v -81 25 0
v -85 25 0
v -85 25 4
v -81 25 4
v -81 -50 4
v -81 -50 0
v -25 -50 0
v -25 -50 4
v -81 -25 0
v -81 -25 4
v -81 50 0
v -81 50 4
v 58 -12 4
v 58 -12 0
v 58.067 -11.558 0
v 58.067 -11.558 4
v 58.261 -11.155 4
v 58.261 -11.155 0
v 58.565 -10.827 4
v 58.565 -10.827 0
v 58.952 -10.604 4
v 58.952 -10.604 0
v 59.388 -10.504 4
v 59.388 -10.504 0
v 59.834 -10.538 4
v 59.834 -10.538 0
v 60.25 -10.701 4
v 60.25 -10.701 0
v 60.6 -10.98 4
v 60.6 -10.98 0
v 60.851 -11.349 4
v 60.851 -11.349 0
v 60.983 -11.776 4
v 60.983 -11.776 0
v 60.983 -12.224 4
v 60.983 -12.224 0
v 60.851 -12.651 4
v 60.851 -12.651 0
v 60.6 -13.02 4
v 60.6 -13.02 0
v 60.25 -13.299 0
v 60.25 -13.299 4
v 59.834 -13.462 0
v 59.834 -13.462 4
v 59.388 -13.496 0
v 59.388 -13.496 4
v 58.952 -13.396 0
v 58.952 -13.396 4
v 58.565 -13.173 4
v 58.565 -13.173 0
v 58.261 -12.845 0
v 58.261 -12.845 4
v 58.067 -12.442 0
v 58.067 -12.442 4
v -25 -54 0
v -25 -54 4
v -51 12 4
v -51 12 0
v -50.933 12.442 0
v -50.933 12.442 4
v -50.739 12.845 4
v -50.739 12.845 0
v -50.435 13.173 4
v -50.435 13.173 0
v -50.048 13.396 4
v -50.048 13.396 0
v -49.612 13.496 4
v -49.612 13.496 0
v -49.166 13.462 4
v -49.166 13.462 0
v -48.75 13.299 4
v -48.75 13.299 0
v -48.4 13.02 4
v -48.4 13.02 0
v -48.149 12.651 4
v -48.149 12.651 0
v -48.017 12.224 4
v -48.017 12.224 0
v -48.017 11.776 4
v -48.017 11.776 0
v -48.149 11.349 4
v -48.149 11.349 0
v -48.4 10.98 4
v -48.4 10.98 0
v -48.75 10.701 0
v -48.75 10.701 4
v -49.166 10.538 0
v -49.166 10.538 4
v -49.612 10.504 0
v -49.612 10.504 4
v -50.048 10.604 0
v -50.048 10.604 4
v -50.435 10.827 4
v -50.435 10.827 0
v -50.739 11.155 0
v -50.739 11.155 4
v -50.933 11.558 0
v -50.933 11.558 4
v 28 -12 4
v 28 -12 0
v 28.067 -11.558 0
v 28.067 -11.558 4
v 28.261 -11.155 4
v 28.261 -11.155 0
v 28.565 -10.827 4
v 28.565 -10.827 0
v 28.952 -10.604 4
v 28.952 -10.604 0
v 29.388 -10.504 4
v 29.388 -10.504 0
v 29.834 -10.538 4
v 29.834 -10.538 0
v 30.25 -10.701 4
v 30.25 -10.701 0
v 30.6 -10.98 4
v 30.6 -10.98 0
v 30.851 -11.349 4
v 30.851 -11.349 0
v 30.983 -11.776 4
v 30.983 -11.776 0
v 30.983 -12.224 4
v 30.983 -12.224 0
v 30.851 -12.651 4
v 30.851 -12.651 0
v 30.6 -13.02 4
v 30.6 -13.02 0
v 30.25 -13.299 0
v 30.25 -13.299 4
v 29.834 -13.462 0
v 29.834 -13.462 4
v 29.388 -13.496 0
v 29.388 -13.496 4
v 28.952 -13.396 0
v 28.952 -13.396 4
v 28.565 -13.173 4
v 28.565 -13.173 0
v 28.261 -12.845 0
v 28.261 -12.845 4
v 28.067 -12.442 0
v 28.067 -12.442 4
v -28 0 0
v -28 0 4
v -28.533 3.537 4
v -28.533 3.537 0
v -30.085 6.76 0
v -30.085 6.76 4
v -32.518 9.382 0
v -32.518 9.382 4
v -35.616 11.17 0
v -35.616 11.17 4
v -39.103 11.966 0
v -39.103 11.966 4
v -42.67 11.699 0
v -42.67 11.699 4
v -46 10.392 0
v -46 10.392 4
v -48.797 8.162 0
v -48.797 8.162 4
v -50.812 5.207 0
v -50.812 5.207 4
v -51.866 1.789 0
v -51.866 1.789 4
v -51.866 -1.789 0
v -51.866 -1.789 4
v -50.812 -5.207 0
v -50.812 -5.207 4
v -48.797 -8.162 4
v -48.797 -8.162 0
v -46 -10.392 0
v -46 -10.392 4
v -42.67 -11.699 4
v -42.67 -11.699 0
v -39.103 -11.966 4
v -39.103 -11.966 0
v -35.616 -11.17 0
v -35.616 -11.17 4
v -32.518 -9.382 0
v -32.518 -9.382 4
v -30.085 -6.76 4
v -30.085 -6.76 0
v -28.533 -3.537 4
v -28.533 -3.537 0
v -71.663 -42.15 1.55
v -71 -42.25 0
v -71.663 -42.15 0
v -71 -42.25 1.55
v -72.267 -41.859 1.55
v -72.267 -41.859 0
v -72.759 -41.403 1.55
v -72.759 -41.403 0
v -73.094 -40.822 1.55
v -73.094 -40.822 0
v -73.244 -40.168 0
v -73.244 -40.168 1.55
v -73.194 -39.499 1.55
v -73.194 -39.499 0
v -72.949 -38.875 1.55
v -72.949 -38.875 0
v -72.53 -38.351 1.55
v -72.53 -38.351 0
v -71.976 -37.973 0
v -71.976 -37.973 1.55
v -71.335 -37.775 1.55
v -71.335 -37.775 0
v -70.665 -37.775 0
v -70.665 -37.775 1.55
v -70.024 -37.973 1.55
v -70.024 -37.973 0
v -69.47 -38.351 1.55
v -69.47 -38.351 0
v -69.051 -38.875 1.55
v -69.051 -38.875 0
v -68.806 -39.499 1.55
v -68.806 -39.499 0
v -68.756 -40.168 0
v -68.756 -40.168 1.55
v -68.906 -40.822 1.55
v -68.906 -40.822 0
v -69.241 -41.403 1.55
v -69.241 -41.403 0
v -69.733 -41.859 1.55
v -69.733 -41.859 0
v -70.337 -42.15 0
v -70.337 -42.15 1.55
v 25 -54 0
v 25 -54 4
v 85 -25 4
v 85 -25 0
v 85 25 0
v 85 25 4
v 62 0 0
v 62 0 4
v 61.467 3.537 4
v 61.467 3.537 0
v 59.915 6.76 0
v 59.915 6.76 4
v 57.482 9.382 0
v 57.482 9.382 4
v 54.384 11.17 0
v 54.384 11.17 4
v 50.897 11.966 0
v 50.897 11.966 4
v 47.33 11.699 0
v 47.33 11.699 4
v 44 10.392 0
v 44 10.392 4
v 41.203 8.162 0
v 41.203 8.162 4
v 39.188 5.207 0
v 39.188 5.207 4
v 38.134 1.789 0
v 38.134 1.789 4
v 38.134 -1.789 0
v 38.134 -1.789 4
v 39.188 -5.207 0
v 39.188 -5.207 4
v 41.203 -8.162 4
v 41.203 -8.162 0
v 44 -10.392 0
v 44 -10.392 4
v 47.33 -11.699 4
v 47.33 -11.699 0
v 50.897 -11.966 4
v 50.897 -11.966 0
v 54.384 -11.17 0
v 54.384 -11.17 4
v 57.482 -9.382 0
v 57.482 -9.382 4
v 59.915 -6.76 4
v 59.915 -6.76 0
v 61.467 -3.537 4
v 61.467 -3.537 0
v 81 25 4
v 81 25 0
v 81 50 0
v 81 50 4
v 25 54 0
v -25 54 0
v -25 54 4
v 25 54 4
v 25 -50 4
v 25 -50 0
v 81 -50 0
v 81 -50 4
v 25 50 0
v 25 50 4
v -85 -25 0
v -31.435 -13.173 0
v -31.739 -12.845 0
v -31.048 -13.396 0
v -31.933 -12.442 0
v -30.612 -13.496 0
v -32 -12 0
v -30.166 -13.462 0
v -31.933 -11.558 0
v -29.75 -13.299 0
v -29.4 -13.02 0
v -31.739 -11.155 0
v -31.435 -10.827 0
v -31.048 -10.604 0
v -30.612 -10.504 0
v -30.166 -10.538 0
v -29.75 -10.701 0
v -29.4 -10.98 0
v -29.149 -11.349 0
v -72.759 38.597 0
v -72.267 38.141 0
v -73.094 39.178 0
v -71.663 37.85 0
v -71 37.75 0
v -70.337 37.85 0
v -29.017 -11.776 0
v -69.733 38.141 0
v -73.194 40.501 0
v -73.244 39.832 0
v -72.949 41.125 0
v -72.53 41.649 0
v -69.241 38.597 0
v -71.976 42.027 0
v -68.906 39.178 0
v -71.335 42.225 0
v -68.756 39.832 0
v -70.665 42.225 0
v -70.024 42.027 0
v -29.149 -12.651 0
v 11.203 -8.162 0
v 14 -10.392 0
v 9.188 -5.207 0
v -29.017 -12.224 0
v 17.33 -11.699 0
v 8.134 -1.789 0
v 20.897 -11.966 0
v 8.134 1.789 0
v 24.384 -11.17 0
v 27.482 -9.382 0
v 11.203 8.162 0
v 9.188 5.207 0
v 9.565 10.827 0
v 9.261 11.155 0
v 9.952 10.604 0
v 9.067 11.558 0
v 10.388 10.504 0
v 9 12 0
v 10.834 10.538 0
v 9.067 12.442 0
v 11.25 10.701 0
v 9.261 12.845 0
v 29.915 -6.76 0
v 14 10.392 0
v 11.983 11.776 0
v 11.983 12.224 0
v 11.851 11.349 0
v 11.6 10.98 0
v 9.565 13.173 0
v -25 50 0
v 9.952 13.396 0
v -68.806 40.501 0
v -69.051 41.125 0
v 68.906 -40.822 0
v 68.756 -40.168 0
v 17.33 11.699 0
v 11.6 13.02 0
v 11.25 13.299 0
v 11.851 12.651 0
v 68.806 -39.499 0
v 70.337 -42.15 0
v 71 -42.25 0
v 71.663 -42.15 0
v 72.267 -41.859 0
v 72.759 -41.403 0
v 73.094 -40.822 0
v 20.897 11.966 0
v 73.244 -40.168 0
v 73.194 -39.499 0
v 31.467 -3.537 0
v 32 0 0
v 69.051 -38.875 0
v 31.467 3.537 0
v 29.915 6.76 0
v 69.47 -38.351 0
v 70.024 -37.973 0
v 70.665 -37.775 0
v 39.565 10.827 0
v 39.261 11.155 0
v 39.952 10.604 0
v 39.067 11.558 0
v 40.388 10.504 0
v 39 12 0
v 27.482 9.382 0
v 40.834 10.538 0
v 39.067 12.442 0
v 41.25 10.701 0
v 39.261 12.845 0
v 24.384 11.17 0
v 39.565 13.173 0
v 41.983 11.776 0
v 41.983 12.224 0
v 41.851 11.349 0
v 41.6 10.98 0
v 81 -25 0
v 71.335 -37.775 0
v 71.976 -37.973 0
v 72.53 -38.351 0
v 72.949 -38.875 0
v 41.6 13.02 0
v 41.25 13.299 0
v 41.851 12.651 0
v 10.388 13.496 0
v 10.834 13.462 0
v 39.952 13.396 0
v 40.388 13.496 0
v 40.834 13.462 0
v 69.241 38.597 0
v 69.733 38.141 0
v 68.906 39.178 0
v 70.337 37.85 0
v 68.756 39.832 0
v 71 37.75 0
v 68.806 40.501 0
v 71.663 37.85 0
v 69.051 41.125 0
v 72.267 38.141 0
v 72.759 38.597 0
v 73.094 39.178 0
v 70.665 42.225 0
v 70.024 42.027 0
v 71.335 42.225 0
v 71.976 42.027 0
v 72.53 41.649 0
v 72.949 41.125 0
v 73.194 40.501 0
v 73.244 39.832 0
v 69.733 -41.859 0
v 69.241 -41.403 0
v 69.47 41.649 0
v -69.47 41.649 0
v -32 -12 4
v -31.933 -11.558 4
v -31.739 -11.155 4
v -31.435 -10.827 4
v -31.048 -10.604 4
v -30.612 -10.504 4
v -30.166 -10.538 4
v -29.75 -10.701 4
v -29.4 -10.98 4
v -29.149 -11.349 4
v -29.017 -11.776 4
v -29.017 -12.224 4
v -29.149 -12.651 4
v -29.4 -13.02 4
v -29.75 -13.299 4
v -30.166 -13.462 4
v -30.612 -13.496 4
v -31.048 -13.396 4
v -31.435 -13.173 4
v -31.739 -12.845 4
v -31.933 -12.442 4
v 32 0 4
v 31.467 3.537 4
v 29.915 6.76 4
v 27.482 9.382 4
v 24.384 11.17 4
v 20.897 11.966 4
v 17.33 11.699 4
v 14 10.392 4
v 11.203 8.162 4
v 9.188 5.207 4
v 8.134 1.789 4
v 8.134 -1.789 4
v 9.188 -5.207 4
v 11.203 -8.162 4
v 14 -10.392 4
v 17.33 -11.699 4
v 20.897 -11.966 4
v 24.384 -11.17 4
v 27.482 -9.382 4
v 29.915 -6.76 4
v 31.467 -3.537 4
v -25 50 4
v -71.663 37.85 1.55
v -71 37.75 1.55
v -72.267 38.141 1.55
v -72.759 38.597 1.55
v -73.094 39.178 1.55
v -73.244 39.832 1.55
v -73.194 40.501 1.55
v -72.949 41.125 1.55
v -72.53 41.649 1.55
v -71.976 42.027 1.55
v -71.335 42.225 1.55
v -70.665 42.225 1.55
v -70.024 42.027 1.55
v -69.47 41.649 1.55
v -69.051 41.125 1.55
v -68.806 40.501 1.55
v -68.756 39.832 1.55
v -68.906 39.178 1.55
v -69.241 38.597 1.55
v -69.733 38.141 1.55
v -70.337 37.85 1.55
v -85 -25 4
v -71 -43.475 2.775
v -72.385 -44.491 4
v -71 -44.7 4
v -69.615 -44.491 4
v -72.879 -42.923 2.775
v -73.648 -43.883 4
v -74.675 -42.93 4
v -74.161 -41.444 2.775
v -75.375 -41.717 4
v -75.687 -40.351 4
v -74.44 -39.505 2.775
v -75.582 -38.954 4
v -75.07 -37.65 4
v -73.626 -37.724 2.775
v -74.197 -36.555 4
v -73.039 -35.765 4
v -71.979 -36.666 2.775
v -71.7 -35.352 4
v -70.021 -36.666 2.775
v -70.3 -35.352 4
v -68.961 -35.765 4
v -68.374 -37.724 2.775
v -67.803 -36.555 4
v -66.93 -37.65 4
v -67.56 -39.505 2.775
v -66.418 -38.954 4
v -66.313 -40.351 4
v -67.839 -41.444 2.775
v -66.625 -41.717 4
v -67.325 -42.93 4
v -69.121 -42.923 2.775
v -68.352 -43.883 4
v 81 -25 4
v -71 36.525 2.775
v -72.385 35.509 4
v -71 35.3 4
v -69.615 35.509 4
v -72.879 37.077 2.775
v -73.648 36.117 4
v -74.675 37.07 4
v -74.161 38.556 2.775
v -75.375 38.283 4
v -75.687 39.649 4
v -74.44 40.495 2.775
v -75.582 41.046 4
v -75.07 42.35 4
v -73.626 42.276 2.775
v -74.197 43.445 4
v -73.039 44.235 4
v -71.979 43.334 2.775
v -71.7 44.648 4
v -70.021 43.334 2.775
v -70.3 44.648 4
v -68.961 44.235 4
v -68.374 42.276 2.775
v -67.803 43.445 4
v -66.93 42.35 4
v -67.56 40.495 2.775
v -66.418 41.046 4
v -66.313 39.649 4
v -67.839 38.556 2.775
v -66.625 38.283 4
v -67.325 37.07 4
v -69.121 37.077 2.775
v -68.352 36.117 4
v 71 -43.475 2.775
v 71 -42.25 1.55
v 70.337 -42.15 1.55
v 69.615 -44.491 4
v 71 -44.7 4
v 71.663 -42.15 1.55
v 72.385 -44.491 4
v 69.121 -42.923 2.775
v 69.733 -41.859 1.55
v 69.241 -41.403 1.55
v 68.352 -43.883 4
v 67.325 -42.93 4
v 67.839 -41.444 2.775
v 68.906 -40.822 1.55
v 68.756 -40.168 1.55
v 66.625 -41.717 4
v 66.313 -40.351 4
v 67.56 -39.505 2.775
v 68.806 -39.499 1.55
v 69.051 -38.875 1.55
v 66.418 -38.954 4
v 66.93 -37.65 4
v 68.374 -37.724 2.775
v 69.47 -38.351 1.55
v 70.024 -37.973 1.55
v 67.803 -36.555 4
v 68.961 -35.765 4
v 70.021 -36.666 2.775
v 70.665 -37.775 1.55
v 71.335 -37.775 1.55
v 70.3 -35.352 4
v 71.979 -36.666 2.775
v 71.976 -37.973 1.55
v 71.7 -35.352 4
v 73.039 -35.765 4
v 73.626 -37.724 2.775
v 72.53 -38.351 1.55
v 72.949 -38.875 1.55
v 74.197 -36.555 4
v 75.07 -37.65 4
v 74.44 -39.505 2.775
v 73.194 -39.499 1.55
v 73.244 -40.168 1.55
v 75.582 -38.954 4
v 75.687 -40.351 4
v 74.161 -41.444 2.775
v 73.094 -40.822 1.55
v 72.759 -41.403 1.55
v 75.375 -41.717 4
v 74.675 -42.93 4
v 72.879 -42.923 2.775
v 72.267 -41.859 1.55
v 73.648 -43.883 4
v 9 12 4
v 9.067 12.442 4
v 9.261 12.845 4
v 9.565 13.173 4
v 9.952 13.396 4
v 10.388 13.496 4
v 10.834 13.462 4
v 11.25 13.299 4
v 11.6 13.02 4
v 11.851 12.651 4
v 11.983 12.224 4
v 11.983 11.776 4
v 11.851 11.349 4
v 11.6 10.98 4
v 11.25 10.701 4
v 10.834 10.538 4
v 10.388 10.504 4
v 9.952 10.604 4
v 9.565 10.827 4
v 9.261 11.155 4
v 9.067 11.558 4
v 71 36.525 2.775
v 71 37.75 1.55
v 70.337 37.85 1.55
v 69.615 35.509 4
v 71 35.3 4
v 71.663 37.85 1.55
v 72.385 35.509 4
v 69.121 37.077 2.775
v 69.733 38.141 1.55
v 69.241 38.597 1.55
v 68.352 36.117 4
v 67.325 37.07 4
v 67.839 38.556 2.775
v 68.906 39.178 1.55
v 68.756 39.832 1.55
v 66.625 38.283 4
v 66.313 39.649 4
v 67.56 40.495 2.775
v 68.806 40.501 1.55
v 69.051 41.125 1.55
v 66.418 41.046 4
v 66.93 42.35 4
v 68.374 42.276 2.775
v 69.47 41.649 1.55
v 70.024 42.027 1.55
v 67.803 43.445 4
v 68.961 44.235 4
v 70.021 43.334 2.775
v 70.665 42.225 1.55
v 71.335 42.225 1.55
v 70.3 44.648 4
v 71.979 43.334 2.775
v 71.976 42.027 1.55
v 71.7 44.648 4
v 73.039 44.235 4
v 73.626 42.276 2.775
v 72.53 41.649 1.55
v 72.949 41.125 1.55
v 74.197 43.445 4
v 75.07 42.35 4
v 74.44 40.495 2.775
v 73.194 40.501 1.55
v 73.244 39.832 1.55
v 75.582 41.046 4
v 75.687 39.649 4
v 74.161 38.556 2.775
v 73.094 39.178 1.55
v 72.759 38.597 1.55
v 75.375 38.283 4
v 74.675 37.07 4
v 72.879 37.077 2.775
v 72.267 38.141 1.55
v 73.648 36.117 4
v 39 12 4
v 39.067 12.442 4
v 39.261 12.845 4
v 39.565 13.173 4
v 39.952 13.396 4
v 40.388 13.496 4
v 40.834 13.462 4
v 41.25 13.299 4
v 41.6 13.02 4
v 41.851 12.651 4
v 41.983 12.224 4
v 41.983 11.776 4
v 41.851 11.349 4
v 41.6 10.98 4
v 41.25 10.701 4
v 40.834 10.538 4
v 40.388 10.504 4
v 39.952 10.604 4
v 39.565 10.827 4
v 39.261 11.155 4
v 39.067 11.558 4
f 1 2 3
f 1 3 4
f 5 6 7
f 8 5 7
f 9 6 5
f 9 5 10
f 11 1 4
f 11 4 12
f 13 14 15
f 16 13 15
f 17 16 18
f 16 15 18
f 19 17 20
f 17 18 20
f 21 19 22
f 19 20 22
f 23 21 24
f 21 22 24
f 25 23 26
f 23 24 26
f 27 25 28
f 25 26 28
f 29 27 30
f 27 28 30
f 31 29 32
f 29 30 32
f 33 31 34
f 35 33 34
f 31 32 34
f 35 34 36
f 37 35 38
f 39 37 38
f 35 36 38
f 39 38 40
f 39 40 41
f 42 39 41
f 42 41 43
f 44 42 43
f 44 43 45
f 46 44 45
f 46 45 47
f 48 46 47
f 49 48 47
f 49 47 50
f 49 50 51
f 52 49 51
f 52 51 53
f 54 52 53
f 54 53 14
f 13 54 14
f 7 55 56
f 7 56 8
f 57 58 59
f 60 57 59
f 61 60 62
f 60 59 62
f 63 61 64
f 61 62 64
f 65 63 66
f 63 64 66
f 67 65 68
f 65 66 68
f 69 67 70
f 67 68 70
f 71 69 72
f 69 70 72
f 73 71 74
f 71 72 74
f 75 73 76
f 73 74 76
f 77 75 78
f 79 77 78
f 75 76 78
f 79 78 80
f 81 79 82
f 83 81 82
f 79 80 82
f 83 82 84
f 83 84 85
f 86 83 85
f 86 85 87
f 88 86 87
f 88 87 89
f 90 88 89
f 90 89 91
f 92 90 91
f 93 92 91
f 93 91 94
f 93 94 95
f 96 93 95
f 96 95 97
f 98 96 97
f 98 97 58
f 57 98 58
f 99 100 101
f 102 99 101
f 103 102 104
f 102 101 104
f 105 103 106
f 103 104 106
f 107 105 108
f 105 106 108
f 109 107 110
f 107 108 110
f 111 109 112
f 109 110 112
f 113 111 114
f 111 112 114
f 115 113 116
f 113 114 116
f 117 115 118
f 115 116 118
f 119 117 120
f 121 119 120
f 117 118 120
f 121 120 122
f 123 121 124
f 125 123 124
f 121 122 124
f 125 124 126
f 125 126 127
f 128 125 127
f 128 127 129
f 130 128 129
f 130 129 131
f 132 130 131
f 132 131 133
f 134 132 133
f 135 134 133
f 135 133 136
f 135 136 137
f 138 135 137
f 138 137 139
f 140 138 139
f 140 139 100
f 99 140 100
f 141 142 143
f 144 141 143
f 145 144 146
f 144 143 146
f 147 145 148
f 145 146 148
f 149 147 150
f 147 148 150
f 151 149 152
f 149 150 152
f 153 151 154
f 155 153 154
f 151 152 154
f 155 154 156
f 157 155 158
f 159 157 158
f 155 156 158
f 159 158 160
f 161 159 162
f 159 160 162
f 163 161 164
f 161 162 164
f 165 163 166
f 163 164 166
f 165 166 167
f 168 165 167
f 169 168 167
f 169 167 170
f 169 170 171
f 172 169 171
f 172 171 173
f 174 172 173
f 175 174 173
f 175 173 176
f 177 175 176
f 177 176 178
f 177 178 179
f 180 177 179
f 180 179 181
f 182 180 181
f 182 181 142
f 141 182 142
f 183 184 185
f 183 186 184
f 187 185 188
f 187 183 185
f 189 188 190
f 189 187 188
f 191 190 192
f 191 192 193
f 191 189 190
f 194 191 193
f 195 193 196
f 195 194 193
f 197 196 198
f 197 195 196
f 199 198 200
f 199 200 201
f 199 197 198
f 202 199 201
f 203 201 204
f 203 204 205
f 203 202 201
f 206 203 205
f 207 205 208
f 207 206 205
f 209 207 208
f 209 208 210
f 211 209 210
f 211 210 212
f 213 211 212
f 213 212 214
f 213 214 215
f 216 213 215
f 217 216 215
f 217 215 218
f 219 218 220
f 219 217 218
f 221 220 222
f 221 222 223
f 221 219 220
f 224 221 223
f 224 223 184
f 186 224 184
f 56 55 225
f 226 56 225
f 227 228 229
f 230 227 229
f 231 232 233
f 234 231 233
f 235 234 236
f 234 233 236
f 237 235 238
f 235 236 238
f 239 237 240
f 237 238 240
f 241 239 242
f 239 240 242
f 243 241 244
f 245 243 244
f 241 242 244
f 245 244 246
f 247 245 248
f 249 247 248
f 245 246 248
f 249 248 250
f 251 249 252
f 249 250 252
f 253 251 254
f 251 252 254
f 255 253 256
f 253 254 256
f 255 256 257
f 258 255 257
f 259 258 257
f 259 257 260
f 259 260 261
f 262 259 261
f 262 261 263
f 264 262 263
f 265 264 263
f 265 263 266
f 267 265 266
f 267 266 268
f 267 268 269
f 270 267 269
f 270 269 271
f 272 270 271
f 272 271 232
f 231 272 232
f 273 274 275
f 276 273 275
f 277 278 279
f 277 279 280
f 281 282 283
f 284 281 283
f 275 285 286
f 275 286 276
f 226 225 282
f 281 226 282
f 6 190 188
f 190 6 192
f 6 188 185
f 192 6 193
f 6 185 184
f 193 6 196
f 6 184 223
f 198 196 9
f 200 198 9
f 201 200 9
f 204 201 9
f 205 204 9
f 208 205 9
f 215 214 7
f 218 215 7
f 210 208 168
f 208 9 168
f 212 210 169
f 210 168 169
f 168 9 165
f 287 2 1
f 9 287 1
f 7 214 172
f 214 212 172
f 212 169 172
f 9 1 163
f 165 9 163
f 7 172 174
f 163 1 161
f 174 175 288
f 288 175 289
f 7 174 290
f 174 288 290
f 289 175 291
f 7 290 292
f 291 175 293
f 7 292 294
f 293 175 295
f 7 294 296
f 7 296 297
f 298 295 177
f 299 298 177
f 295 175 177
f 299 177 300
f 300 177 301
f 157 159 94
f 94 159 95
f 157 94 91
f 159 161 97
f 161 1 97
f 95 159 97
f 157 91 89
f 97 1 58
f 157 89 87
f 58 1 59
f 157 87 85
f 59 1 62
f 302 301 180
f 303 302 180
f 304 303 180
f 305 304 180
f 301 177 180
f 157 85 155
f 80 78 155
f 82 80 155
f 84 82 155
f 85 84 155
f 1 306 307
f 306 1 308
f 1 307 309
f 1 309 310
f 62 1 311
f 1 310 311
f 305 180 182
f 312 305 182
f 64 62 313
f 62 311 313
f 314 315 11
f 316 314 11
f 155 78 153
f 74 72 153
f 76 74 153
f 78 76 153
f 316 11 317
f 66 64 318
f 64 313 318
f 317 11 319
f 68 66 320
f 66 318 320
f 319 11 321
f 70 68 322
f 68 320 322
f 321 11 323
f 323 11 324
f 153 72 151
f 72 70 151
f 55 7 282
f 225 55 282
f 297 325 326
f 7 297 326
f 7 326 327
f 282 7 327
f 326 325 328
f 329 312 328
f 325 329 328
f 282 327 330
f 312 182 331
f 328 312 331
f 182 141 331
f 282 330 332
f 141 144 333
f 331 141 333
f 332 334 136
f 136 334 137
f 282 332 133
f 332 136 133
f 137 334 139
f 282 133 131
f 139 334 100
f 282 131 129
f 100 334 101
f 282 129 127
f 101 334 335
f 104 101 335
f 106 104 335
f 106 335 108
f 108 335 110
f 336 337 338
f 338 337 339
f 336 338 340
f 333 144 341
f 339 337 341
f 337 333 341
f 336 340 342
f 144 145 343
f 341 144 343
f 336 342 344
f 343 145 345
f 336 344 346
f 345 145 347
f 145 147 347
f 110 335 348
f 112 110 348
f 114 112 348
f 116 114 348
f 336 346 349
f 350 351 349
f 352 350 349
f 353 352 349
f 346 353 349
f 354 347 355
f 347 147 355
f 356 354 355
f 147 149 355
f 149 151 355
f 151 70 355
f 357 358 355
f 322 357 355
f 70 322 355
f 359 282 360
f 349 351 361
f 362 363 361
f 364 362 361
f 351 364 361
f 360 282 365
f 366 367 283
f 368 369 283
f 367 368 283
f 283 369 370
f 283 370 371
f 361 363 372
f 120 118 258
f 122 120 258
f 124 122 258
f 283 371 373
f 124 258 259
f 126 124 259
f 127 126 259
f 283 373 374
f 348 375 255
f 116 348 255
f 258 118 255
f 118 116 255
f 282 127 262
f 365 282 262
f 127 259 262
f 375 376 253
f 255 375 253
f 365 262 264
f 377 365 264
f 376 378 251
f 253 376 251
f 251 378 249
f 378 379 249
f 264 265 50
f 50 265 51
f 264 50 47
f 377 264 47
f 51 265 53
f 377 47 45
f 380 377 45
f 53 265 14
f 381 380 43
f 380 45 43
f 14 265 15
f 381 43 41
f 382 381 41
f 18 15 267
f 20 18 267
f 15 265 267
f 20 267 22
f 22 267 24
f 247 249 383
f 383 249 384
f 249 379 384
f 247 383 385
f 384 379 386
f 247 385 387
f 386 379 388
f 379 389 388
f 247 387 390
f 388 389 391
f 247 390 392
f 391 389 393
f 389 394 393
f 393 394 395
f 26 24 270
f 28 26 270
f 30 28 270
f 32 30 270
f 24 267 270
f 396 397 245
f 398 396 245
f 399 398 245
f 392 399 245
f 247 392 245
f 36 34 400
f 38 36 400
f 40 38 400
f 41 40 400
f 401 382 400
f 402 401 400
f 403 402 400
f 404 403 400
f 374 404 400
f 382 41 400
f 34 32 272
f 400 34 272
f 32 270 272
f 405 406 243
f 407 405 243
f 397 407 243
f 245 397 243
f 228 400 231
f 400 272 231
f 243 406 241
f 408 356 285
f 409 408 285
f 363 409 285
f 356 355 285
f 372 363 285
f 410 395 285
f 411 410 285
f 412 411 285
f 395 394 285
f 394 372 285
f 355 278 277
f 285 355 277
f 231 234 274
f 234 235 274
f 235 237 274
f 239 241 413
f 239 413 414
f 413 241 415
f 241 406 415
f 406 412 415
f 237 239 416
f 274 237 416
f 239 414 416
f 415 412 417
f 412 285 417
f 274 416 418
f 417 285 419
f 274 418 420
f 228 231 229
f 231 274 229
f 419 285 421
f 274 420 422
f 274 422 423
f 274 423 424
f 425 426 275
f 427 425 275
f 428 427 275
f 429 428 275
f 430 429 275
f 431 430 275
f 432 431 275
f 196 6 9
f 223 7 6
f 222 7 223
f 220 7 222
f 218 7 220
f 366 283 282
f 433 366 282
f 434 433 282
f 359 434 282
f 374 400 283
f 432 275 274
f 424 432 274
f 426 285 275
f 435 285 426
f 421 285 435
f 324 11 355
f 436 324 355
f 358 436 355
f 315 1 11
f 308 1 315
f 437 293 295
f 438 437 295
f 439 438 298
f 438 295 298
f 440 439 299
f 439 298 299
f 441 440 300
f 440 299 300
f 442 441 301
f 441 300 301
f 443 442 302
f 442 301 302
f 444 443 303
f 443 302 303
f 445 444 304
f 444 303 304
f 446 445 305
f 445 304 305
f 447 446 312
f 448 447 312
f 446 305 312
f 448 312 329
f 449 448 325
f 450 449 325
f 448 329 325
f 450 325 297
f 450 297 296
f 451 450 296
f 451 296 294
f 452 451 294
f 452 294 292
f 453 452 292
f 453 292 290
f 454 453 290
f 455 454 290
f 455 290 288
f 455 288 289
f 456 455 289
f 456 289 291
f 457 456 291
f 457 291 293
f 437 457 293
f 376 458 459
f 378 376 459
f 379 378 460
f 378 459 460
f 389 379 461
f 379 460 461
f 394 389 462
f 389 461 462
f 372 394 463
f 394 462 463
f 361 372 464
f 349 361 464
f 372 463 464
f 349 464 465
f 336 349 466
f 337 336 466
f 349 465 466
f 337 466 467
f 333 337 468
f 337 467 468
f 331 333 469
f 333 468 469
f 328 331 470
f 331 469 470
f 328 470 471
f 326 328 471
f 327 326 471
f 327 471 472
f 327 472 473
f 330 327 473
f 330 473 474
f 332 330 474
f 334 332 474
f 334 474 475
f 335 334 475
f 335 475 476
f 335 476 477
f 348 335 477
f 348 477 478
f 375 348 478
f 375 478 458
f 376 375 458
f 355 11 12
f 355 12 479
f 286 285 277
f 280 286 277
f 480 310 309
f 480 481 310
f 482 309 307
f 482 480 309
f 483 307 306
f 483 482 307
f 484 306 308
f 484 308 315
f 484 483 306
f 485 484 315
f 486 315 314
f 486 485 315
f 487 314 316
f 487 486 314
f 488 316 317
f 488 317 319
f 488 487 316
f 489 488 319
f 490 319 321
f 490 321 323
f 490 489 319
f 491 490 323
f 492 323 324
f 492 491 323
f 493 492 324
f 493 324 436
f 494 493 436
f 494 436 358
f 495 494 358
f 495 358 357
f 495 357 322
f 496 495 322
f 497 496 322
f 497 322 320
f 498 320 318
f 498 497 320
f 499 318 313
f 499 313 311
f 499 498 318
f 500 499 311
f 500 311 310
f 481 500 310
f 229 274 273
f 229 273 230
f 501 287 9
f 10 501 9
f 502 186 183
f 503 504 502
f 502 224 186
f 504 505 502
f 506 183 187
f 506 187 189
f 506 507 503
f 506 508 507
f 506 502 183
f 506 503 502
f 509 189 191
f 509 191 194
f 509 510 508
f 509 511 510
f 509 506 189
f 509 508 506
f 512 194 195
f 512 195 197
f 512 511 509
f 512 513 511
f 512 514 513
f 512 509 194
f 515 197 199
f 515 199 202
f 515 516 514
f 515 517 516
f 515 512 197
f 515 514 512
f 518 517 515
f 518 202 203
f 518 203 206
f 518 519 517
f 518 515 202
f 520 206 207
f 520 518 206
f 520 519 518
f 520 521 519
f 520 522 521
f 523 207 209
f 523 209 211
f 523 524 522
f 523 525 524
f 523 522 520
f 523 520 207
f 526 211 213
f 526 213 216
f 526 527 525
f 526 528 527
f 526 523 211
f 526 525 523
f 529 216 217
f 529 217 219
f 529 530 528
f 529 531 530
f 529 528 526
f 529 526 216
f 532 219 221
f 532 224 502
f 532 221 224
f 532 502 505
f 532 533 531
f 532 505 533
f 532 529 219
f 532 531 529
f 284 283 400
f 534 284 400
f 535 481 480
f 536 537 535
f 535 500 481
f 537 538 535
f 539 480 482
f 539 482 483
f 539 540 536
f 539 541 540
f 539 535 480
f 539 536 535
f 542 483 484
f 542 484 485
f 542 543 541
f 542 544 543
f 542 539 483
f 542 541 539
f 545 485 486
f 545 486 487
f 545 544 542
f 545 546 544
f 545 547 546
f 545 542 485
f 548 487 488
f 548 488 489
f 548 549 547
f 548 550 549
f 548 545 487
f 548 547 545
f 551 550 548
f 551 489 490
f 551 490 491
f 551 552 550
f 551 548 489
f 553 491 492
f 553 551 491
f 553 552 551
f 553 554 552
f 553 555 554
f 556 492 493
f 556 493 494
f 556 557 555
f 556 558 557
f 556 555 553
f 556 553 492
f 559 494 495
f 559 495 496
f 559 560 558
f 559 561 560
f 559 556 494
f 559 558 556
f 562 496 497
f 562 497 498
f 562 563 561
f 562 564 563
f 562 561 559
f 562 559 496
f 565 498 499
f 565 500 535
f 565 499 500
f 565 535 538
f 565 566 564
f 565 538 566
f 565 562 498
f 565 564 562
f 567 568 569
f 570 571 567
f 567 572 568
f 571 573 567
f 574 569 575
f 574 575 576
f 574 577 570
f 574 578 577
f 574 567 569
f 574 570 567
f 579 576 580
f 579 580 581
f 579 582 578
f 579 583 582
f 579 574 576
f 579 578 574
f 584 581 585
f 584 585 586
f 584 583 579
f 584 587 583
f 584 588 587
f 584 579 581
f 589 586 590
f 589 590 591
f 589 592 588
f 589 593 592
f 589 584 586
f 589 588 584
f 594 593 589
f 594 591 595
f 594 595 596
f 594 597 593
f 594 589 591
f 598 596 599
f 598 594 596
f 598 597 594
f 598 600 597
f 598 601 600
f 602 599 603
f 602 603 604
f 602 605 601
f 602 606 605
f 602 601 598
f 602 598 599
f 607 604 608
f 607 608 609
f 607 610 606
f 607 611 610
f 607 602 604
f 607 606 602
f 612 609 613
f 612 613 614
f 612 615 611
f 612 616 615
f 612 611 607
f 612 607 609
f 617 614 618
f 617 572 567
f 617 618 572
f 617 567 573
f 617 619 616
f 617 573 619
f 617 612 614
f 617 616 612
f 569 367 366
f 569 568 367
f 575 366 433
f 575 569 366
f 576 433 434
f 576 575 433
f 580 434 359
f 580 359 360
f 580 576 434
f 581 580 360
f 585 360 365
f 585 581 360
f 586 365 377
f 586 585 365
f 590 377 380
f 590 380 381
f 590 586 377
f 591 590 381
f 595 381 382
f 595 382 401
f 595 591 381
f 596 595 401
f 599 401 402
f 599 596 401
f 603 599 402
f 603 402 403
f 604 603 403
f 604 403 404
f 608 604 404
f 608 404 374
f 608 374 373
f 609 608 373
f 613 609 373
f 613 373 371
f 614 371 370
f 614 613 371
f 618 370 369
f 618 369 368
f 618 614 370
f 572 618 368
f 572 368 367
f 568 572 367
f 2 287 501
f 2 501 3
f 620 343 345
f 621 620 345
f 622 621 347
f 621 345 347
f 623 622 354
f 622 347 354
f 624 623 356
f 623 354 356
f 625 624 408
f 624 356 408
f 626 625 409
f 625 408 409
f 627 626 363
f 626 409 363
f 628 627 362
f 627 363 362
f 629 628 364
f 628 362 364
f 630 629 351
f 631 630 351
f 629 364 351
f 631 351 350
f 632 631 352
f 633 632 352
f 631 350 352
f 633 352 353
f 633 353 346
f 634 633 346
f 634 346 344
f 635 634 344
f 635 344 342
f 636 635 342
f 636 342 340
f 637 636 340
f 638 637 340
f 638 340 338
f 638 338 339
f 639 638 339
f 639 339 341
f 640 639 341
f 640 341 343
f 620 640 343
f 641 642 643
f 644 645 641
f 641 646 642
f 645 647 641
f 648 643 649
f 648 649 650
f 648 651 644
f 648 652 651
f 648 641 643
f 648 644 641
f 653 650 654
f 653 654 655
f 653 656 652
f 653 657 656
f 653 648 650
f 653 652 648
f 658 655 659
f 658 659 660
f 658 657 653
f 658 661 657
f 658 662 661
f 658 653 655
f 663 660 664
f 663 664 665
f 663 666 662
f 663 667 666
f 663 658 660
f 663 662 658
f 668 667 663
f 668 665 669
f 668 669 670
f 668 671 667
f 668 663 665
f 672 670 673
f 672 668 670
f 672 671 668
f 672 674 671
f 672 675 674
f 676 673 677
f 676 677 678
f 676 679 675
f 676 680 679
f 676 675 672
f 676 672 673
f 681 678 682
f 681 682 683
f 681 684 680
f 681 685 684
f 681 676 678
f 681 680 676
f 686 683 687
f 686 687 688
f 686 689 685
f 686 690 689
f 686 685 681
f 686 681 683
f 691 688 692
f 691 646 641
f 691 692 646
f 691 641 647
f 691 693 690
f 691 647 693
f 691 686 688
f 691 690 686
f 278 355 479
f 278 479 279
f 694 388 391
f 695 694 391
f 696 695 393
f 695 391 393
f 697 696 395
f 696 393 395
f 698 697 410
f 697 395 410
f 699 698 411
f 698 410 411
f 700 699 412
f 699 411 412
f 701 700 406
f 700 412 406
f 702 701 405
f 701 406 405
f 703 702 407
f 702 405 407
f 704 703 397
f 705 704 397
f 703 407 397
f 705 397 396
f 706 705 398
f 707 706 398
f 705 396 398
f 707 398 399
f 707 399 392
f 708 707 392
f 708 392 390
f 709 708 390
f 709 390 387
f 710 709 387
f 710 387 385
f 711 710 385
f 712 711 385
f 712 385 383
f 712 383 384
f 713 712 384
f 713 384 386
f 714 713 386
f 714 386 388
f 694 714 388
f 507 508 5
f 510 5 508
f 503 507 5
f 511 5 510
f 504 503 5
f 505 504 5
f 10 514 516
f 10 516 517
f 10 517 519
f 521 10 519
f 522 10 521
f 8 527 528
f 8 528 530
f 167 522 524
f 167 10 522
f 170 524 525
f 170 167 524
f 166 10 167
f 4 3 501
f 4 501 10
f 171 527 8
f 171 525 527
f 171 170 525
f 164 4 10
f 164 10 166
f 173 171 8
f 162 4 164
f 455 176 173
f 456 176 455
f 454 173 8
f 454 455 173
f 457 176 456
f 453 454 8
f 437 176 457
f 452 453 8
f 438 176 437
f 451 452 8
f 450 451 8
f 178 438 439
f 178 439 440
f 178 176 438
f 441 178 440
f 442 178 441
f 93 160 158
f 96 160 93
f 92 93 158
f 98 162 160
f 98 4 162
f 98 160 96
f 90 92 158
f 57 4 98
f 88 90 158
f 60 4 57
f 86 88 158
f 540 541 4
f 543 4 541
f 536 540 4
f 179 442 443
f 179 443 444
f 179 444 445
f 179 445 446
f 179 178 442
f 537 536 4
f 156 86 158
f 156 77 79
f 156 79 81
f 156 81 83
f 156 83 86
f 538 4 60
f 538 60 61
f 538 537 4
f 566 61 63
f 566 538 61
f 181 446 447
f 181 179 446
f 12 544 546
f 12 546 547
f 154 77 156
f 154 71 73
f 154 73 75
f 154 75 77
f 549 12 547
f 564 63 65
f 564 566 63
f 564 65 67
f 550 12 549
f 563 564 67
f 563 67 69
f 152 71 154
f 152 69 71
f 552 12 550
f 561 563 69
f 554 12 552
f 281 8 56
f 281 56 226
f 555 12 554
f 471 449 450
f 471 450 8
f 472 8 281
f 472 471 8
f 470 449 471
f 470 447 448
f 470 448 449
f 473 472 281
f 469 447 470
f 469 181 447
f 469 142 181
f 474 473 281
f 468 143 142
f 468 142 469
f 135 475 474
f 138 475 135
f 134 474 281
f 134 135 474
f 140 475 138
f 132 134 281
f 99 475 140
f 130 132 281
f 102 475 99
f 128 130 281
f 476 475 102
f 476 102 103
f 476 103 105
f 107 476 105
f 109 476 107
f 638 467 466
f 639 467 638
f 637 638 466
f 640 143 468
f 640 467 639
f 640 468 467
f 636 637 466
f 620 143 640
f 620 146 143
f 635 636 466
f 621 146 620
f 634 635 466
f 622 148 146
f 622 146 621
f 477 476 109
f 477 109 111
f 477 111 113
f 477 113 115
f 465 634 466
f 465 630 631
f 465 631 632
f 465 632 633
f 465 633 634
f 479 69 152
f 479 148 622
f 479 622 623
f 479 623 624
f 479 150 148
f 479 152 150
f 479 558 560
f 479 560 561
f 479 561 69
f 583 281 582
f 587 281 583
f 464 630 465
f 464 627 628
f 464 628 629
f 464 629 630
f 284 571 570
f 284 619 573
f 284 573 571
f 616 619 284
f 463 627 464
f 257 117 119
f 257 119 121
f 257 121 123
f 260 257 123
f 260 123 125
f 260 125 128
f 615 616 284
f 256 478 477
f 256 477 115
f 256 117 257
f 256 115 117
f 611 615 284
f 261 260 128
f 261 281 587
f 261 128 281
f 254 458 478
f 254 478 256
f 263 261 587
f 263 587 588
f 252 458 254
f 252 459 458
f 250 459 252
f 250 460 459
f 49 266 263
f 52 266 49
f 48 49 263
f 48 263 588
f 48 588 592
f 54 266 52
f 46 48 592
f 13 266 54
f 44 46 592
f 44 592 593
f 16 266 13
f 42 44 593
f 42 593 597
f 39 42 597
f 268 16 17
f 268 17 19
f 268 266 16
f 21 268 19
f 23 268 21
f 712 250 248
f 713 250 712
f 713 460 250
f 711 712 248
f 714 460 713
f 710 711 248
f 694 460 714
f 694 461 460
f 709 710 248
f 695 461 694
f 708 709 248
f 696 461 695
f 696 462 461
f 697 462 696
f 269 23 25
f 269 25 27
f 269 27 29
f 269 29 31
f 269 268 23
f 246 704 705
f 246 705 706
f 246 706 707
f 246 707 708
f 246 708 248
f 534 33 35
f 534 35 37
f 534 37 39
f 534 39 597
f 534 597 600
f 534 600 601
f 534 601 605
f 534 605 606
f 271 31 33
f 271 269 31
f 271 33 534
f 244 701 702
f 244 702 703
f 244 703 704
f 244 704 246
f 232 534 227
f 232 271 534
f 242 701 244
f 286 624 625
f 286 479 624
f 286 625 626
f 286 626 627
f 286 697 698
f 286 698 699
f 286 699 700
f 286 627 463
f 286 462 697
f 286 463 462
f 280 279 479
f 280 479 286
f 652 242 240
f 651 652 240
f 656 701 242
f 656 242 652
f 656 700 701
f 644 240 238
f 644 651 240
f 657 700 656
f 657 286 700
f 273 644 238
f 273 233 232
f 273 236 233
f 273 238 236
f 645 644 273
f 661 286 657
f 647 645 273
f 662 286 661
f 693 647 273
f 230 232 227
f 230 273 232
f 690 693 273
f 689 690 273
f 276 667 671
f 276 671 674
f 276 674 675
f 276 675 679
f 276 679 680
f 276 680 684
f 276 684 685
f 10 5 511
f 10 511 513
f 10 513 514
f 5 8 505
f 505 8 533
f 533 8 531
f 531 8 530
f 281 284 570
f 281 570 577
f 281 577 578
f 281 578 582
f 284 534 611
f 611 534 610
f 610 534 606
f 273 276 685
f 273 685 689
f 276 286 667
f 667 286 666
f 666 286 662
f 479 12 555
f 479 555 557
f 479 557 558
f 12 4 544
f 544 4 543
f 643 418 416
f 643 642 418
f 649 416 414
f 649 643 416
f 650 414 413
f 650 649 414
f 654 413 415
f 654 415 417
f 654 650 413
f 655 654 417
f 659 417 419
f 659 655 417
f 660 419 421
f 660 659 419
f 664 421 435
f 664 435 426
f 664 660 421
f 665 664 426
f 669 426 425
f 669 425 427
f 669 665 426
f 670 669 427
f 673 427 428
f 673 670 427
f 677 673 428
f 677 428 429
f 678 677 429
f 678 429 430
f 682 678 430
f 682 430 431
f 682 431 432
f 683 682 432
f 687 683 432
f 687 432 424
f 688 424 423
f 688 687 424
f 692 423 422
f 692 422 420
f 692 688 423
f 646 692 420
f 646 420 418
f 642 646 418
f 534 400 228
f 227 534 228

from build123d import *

# Parameters (mm, degrees)
SKETCH1_W                                    = 162
SKETCH1_H                                    = 100
SKETCH1_W_2                                  = 50
SKETCH1_H_2                                  = 4
SKETCH1_W_3                                  = 4
SKETCH1_H_3                                  = 50
BOSS_EXTRUDE2_DEPTH                          = 4
CUT_EXTRUDE1_REACH                           = 102.782
SKETCH2_R                                    = 12
CSK_FOR_M4_COUNTERSUNK_FLAT_HEAD_SCR_2_COUNT = 2
CSK_FOR_M4_COUNTERSUNK_FLAT_HEAD_SCR_2_PITCH = 142
CSK_FOR_M4_COUNTERSUNK_FLAT_HEAD_SCR_3_COUNT = 2
CSK_FOR_M4_COUNTERSUNK_FLAT_HEAD_SCR_3_PITCH = 162.984661855
CSK_FOR_M4_COUNTERSUNK_FLAT_HEAD_SCR_4_COUNT = 2
CSK_FOR_M4_COUNTERSUNK_FLAT_HEAD_SCR_4_PITCH = 80
F_3_0MM_DOWEL_HOLE1_D                        = 3


with BuildPart() as part:
    # Sketch1 → Boss-Extrude2 (new body)
    with BuildSketch(Plane.XY):
        Rectangle(SKETCH1_W, SKETCH1_H)
        with Locations((0, 52)):
            Rectangle(SKETCH1_W_2, SKETCH1_H_2)
        with Locations((83, 0)):
            Rectangle(SKETCH1_W_3, SKETCH1_H_3)
        with Locations((-83, 0)):
            Rectangle(SKETCH1_W_3, SKETCH1_H_3)
        with Locations((0, -52)):
            Rectangle(SKETCH1_W_2, SKETCH1_H_2)
    extrude(amount=BOSS_EXTRUDE2_DEPTH)

    # Sketch2 → Cut-Extrude1 (cut, up to next)
    with BuildSketch(Plane.XY.offset(4), mode=Mode.PRIVATE) as cut_extrude1_sk1:
        with Locations((-40, 0)):
            Circle(SKETCH2_R)
    cut_extrude1_tool1 = extrude(cut_extrude1_sk1.sketch, amount=-CUT_EXTRUDE1_REACH, mode=Mode.PRIVATE) & part.part
    # Sketch2 → Cut-Extrude1 (cut, up to next)
    with BuildSketch(Plane.XY.offset(4), mode=Mode.PRIVATE) as cut_extrude1_sk2:
        with Locations((20, 0)):
            Circle(SKETCH2_R)
    cut_extrude1_tool2 = extrude(cut_extrude1_sk2.sketch, amount=-CUT_EXTRUDE1_REACH, mode=Mode.PRIVATE) & part.part
    # Sketch2 → Cut-Extrude1 (cut, up to next)
    with BuildSketch(Plane.XY.offset(4), mode=Mode.PRIVATE) as cut_extrude1_sk3:
        with Locations((50, 0)):
            Circle(SKETCH2_R)
    cut_extrude1_tool3 = extrude(cut_extrude1_sk3.sketch, amount=-CUT_EXTRUDE1_REACH, mode=Mode.PRIVATE) & part.part
    add(cut_extrude1_tool1.solids().sort_by_distance((-40, 0, 4))[0], mode=Mode.SUBTRACT)
    add(cut_extrude1_tool2.solids().sort_by_distance((20, 0, 4))[0], mode=Mode.SUBTRACT)
    add(cut_extrude1_tool3.solids().sort_by_distance((50, 0, 4))[0], mode=Mode.SUBTRACT)

    # Sketch4 → CSK for M4 Countersunk Flat Head Screw1 (revolve, cut)
    with BuildSketch(Plane(origin=(-71, 40, 4), x_dir=(0, -1, 0), z_dir=(1, 0, 0))):
        Polygon((0, 0), (0, 4), (2.25, 4), (2.25, 2.45), (4.7, 0), align=None)
    csk_for_m4_countersunk_flat_head_screw1 = revolve(axis=Axis((-71, 40, 10.35), (0, 0, -1)), mode=Mode.SUBTRACT)

    # CSK for M4 Countersunk Flat Head Scr 2: CSK for M4 Countersunk Flat Head Screw1 ×2
    with Locations(*[(i * CSK_FOR_M4_COUNTERSUNK_FLAT_HEAD_SCR_2_PITCH, 0, 0) for i in range(1, CSK_FOR_M4_COUNTERSUNK_FLAT_HEAD_SCR_2_COUNT)]):
        add(csk_for_m4_countersunk_flat_head_screw1, mode=Mode.SUBTRACT)

    # CSK for M4 Countersunk Flat Head Scr 3: CSK for M4 Countersunk Flat Head Screw1 ×2
    with Locations(*[Vector(0.8712476277448776, -0.49084373394077596, 0) * (i * CSK_FOR_M4_COUNTERSUNK_FLAT_HEAD_SCR_3_PITCH) for i in range(1, CSK_FOR_M4_COUNTERSUNK_FLAT_HEAD_SCR_3_COUNT)]):
        add(csk_for_m4_countersunk_flat_head_screw1, mode=Mode.SUBTRACT)

    # CSK for M4 Countersunk Flat Head Scr 4: CSK for M4 Countersunk Flat Head Screw1 ×2
    with Locations(*[(0, -i * CSK_FOR_M4_COUNTERSUNK_FLAT_HEAD_SCR_4_PITCH, 0) for i in range(1, CSK_FOR_M4_COUNTERSUNK_FLAT_HEAD_SCR_4_COUNT)]):
        add(csk_for_m4_countersunk_flat_head_screw1, mode=Mode.SUBTRACT)

    # Ø3.0mm Dowel Hole1 (through all)
    with Locations(Plane(origin=(-49.5, 12, 4), x_dir=(1, 0, 0), z_dir=(0, 0, 1))):
        with Locations((0, 0), (19, -24), (60, 0), (79, -24), (90, 0), (109, -24)):
            Hole(F_3_0MM_DOWEL_HOLE1_D / 2)


solid = part.part
